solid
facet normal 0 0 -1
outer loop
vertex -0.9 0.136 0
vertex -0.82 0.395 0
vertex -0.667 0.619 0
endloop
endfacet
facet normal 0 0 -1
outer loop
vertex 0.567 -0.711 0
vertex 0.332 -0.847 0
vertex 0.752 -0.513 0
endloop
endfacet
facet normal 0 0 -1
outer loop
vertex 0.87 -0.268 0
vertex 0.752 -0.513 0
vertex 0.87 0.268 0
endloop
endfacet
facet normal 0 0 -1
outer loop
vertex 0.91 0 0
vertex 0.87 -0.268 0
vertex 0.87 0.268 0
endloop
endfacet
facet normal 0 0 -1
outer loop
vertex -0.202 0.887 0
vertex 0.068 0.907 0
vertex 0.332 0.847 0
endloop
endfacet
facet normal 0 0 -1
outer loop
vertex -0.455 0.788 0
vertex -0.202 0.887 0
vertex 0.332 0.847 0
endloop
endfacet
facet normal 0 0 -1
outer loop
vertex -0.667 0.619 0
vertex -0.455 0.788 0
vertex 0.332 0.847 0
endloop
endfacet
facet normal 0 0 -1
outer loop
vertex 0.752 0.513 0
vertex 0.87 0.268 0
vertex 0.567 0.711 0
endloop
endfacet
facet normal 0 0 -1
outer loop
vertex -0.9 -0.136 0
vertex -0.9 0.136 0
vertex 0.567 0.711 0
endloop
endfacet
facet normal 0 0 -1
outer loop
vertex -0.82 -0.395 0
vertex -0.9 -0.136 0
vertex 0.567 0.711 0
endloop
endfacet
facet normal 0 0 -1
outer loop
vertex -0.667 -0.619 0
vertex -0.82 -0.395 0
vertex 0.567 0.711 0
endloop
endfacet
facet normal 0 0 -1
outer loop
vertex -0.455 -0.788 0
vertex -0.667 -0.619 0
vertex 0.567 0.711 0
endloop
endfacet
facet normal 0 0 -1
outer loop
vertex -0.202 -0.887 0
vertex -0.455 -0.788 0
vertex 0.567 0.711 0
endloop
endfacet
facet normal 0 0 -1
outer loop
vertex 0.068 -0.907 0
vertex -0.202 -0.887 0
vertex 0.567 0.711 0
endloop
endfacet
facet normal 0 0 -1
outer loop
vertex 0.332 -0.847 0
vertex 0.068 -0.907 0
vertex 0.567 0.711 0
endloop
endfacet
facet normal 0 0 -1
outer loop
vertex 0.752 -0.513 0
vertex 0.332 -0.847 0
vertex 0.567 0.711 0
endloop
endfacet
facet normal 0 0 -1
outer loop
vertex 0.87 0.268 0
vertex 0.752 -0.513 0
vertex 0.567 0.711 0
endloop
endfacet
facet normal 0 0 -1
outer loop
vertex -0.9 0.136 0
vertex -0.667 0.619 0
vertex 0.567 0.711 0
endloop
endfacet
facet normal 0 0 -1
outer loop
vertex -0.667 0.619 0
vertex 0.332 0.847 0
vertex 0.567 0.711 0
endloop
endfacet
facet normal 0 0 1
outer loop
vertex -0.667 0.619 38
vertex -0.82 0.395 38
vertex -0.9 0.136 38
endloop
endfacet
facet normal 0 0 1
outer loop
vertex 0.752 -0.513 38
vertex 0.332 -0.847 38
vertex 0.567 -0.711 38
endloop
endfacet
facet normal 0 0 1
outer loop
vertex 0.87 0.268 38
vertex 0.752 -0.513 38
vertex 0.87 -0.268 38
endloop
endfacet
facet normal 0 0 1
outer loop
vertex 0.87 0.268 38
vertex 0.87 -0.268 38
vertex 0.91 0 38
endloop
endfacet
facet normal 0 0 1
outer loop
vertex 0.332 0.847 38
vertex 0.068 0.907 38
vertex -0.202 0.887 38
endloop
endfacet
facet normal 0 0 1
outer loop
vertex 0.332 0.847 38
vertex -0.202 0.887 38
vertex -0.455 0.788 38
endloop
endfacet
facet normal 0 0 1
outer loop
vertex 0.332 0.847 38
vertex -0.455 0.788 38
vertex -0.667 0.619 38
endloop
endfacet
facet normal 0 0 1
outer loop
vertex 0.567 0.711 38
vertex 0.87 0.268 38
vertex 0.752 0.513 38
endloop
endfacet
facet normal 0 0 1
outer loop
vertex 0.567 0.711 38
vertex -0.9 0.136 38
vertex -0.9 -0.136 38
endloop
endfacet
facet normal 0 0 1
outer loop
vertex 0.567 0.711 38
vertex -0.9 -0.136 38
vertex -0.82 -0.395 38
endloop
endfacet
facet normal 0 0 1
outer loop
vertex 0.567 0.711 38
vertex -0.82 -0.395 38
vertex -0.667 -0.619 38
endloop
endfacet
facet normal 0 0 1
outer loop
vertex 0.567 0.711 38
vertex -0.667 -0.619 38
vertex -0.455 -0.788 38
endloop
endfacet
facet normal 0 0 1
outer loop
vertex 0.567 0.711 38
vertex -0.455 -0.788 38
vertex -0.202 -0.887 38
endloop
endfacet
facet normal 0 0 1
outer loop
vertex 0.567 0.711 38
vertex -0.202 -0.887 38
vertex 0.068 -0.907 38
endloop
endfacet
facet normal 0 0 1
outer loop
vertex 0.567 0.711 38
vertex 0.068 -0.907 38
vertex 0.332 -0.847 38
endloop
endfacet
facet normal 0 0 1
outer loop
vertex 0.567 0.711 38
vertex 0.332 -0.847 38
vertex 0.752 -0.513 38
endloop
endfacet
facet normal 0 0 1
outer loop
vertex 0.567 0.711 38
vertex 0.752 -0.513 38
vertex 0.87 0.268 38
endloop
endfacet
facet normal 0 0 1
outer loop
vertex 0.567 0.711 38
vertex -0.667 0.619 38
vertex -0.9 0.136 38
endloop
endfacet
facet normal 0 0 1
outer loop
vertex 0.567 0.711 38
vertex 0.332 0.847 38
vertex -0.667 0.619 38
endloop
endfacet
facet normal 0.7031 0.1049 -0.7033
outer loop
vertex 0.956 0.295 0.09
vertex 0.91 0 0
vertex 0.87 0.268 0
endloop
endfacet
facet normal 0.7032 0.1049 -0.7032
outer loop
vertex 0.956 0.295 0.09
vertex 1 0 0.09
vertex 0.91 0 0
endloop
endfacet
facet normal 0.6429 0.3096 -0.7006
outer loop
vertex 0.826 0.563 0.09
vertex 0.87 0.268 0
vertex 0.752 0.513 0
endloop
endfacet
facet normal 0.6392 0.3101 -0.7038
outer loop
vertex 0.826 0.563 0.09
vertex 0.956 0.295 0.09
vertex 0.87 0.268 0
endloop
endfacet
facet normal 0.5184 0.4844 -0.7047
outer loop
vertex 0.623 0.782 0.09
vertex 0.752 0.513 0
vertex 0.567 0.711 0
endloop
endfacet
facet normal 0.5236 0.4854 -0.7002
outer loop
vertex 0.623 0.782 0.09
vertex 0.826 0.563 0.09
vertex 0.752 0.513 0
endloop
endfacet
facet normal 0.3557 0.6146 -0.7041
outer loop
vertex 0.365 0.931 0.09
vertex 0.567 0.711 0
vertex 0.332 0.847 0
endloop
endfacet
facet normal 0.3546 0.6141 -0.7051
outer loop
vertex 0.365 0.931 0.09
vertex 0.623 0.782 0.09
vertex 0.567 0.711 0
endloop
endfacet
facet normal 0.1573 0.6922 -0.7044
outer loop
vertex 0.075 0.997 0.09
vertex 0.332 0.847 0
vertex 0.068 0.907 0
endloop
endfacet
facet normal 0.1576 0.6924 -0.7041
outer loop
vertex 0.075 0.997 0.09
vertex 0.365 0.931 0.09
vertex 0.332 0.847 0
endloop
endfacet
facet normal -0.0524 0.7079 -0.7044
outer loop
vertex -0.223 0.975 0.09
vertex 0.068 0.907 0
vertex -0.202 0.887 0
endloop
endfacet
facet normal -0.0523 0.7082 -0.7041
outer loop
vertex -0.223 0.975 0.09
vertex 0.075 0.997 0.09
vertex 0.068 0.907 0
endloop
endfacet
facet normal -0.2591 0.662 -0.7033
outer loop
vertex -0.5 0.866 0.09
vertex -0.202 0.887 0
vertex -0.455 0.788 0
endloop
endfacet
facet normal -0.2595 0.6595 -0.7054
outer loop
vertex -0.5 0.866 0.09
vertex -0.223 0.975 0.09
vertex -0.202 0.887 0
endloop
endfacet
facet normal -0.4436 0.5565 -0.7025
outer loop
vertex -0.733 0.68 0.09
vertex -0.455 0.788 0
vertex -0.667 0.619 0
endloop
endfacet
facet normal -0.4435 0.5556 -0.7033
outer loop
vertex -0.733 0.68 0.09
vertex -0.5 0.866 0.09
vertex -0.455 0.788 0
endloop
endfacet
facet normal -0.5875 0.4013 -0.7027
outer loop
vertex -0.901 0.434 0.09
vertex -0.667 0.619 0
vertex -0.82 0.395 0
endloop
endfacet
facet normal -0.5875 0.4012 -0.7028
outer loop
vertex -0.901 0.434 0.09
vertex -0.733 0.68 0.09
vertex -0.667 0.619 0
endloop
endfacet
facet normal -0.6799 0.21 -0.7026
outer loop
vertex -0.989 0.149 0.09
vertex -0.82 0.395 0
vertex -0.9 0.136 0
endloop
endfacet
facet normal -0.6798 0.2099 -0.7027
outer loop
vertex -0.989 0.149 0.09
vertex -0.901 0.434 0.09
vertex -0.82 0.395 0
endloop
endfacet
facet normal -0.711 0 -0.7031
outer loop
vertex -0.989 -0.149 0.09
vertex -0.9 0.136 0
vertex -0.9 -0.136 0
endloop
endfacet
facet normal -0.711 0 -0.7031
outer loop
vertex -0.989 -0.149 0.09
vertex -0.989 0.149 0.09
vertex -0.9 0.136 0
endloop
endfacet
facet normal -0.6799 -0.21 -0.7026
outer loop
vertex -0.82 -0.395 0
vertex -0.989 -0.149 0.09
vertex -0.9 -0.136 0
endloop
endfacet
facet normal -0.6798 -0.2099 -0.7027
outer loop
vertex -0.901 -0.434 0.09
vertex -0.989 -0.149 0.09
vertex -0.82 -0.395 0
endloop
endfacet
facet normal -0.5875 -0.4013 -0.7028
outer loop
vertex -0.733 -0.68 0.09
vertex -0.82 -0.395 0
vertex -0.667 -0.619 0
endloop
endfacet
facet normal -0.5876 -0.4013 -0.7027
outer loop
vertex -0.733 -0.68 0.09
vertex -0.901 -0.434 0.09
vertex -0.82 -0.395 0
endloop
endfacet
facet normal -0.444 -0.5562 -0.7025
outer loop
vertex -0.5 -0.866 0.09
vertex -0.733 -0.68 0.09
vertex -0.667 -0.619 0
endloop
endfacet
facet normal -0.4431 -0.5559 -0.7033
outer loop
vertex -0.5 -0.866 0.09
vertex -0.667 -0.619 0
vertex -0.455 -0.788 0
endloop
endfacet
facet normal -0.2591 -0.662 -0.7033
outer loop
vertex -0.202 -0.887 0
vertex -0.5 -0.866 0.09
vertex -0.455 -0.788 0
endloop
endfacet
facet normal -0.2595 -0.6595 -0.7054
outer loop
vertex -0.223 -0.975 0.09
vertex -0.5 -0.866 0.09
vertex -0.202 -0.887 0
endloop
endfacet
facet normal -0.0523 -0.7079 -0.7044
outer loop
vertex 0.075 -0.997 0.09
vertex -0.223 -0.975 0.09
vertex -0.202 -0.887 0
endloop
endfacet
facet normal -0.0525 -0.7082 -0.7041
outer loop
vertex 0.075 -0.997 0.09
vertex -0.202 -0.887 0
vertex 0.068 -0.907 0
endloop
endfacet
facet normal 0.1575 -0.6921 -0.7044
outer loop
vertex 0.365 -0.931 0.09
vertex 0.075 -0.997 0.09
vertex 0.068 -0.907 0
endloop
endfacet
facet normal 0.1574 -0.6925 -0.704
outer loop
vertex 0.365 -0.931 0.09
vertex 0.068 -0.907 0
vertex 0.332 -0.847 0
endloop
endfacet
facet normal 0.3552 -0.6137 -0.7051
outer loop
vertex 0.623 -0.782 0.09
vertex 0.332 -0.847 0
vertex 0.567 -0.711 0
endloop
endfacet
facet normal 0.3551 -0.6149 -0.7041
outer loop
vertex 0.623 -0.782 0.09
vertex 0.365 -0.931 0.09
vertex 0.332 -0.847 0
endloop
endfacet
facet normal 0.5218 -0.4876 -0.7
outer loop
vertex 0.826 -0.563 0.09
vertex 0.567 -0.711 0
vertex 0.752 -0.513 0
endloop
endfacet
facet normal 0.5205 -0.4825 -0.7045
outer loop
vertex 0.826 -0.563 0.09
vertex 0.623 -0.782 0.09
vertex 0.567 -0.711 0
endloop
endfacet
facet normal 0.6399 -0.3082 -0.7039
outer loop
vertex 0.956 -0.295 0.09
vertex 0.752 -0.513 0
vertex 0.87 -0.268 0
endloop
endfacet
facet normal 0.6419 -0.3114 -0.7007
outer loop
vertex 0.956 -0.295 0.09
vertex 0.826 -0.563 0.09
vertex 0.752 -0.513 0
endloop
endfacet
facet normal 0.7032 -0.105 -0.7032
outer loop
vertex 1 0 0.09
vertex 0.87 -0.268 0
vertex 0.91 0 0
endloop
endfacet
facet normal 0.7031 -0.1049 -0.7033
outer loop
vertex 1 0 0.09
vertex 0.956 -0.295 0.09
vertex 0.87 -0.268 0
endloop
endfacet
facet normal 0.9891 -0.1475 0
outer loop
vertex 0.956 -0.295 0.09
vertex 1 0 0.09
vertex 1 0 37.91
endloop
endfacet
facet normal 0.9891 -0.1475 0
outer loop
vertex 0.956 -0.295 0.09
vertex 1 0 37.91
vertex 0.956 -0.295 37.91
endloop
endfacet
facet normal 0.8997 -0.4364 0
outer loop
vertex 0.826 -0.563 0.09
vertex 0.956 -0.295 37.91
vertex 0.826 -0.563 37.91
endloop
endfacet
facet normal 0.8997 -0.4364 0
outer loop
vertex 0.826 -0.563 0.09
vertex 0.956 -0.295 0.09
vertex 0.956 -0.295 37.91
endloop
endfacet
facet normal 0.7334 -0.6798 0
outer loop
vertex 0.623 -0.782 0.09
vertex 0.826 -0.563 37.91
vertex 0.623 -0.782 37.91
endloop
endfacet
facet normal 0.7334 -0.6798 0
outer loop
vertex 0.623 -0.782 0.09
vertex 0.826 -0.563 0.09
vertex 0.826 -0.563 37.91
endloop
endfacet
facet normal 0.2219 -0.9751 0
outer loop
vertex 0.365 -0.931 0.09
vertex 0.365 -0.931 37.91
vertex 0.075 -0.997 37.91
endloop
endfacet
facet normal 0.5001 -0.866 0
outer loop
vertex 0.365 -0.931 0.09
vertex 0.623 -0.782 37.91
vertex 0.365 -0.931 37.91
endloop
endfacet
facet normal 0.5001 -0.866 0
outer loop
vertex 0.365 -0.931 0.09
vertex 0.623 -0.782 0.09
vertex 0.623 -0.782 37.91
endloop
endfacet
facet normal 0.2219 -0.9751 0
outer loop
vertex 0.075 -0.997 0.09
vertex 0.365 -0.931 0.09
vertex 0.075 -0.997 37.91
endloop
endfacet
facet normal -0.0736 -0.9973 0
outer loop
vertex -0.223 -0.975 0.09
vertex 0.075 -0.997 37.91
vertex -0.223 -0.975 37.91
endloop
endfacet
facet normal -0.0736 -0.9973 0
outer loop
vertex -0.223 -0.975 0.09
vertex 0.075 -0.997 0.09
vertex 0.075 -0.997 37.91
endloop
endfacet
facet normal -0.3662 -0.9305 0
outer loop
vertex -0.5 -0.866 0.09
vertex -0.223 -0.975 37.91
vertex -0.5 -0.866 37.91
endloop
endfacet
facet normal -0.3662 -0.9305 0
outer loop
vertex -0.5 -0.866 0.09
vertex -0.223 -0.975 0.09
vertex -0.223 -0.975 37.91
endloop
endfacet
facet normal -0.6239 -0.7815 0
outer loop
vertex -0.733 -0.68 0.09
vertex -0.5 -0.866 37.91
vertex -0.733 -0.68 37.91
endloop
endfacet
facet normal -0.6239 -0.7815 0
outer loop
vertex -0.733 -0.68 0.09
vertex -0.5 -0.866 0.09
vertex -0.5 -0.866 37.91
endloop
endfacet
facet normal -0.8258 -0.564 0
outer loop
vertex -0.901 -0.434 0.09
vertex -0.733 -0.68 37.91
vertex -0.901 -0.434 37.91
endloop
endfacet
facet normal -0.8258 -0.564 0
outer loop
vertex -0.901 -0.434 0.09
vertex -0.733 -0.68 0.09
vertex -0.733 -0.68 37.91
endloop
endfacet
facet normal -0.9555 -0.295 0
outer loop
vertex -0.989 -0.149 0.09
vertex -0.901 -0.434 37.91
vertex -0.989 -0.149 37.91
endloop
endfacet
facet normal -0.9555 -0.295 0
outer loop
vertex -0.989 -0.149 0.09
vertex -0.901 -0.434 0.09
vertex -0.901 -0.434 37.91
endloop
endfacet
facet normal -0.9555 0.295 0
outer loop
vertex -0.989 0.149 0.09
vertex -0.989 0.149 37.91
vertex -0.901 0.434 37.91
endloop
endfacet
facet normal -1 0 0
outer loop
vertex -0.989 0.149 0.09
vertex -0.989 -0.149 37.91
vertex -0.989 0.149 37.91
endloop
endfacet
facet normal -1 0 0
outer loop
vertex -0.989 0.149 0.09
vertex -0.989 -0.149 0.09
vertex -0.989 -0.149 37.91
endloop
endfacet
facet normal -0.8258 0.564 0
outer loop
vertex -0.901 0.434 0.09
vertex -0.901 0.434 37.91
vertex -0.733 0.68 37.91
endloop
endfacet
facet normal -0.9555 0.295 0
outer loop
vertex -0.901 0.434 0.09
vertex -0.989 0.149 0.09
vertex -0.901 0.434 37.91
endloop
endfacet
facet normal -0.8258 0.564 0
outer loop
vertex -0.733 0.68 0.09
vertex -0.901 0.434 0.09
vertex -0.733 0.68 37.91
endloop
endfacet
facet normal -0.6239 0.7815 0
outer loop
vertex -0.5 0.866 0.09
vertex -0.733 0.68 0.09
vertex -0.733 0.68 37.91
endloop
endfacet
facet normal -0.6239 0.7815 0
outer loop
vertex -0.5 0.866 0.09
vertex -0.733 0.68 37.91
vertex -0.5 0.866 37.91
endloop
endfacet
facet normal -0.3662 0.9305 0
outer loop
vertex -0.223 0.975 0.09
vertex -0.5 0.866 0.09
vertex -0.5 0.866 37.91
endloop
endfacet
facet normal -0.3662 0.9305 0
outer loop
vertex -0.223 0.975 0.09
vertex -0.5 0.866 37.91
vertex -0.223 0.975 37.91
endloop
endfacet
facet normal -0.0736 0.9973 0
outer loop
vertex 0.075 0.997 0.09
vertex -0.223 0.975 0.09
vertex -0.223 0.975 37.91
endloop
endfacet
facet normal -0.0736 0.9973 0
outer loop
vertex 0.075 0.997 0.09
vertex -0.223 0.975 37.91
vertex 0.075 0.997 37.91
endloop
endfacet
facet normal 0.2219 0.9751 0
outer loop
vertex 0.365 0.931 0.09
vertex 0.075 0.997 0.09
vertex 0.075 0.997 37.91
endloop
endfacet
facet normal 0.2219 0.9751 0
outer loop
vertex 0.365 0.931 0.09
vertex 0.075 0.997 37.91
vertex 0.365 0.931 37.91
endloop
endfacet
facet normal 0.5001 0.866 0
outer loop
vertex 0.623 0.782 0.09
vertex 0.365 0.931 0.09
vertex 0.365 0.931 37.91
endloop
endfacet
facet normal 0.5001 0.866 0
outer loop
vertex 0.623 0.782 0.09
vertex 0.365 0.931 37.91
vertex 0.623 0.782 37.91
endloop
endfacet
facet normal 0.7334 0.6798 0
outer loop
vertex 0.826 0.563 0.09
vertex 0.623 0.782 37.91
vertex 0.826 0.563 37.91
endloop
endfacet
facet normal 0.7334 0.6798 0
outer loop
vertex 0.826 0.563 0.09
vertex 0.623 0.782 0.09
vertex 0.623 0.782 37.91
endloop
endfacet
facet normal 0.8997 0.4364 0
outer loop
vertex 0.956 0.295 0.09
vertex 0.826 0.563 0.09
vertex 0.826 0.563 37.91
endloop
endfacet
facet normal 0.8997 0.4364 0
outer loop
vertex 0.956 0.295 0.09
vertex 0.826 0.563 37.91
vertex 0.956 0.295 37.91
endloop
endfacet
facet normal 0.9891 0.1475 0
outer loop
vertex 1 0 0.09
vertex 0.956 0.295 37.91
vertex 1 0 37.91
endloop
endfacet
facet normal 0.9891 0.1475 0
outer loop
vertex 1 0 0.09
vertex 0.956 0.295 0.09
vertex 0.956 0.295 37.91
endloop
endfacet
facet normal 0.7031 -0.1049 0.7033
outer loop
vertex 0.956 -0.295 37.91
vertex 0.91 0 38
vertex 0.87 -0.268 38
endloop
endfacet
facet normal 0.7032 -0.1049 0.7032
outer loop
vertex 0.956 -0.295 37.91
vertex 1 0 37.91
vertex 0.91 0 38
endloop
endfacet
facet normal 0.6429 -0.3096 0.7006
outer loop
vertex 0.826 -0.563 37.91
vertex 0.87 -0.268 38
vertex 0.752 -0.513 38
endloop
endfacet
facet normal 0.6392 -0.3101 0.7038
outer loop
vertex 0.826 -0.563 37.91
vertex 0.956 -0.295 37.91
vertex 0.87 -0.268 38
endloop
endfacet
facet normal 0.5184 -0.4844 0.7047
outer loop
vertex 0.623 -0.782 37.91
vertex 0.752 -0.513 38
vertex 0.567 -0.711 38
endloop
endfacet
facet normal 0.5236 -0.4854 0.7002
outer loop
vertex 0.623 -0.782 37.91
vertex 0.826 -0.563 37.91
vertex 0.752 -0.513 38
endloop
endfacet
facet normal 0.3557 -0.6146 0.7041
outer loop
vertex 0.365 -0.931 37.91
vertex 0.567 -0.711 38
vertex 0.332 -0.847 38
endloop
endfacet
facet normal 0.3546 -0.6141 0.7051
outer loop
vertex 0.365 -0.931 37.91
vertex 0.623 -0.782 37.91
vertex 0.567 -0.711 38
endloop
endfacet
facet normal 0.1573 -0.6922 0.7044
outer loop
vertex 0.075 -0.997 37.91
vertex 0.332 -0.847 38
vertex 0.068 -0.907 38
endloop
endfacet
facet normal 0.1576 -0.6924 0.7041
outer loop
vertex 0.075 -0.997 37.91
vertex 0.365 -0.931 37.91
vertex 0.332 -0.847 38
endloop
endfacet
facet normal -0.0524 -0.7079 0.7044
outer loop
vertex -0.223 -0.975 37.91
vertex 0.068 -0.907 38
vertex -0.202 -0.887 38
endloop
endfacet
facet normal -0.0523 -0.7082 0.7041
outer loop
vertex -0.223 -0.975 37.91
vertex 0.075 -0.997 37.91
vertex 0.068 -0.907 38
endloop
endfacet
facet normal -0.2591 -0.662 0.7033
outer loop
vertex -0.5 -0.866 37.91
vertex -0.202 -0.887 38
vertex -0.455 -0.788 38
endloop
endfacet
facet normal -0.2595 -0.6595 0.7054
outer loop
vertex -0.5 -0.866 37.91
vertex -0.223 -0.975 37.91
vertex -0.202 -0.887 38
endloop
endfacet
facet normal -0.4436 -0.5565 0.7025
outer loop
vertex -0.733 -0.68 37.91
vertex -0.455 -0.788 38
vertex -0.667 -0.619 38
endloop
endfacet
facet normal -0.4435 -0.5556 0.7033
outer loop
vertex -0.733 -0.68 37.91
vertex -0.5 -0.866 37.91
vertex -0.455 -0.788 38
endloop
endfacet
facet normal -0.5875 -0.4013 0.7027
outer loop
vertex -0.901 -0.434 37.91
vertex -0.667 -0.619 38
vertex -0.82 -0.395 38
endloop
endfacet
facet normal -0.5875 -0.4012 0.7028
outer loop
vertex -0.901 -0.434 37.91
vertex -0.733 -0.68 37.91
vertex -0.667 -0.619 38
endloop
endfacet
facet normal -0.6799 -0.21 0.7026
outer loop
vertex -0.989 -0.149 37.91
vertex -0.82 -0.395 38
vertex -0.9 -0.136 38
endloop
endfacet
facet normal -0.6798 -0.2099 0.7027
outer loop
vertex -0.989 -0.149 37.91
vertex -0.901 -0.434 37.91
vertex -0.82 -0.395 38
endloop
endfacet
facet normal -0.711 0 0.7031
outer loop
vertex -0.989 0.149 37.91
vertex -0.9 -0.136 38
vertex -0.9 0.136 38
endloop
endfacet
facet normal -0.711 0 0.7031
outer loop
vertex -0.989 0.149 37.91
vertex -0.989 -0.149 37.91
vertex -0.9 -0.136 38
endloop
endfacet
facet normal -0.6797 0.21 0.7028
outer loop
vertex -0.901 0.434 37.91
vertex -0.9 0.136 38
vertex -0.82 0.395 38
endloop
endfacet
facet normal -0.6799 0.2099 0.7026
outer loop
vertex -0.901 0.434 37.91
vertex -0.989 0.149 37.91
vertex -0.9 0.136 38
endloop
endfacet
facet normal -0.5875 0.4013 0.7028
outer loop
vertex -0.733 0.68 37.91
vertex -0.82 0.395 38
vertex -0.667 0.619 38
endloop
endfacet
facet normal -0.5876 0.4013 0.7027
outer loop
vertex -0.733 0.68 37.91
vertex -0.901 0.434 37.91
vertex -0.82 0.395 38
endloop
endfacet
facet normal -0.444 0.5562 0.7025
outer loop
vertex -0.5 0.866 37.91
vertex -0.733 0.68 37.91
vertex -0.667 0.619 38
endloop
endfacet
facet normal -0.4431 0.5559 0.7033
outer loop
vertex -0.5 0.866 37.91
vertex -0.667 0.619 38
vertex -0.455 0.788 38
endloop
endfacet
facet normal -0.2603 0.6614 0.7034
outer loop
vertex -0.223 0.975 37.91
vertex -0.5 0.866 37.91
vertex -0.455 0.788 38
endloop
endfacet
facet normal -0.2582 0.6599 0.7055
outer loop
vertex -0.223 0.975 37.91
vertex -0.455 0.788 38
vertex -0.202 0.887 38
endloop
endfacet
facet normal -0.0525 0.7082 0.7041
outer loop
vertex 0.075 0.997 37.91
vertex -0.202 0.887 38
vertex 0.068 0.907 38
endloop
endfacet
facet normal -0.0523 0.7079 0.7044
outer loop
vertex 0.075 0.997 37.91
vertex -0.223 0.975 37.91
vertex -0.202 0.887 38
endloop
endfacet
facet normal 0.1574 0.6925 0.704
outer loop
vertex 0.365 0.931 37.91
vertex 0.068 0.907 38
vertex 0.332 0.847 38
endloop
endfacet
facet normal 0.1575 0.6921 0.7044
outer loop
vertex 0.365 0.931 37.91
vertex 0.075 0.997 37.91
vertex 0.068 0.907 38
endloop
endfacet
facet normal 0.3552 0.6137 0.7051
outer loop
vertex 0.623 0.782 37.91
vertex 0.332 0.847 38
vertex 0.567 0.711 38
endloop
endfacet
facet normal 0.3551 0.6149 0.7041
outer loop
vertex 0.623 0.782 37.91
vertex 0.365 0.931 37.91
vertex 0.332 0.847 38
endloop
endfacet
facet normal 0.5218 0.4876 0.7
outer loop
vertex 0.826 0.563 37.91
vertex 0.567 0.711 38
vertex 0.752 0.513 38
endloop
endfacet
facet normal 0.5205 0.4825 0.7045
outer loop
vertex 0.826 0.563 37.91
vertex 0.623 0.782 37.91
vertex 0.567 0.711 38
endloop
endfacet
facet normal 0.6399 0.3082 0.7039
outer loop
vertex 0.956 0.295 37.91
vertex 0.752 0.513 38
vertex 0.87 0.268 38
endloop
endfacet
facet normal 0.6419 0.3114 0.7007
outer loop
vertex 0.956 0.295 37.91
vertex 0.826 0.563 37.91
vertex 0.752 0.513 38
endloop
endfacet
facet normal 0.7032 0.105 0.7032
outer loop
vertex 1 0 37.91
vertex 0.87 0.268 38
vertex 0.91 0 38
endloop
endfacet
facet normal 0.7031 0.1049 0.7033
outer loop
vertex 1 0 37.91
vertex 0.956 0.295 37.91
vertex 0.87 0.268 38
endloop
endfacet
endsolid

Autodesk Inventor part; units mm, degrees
ref_plane "YZ Plane" through (0, 0, 0) normal (1, 0, 0) x (0, 1, 0)
ref_plane "XZ Plane" through (0, 0, 0) normal (0, 1, 0) x (-1, 0, 0)
ref_plane "XY Plane" through (0, 0, 0) normal (0, 0, 1) x (1, 0, 0)
sketch "スケッチ1" plane through (0, 0, 0) normal (0, 0, 1) x (1, 0, 0)
  circle A0 centre (0, 0) radius 1
  dimension "d0" = 2
extrude "押し出し1" add sketch "スケッチ1" along normal blind 38
chamfer "面取り1" distance 0.09 angle 45 1 edges at (-1, 0, 0)
chamfer "面取り2" distance 0.09 angle 45 1 edges at (-1, 0, 38)
properties part number "motorshaft2x38" material "鋼、合金"
